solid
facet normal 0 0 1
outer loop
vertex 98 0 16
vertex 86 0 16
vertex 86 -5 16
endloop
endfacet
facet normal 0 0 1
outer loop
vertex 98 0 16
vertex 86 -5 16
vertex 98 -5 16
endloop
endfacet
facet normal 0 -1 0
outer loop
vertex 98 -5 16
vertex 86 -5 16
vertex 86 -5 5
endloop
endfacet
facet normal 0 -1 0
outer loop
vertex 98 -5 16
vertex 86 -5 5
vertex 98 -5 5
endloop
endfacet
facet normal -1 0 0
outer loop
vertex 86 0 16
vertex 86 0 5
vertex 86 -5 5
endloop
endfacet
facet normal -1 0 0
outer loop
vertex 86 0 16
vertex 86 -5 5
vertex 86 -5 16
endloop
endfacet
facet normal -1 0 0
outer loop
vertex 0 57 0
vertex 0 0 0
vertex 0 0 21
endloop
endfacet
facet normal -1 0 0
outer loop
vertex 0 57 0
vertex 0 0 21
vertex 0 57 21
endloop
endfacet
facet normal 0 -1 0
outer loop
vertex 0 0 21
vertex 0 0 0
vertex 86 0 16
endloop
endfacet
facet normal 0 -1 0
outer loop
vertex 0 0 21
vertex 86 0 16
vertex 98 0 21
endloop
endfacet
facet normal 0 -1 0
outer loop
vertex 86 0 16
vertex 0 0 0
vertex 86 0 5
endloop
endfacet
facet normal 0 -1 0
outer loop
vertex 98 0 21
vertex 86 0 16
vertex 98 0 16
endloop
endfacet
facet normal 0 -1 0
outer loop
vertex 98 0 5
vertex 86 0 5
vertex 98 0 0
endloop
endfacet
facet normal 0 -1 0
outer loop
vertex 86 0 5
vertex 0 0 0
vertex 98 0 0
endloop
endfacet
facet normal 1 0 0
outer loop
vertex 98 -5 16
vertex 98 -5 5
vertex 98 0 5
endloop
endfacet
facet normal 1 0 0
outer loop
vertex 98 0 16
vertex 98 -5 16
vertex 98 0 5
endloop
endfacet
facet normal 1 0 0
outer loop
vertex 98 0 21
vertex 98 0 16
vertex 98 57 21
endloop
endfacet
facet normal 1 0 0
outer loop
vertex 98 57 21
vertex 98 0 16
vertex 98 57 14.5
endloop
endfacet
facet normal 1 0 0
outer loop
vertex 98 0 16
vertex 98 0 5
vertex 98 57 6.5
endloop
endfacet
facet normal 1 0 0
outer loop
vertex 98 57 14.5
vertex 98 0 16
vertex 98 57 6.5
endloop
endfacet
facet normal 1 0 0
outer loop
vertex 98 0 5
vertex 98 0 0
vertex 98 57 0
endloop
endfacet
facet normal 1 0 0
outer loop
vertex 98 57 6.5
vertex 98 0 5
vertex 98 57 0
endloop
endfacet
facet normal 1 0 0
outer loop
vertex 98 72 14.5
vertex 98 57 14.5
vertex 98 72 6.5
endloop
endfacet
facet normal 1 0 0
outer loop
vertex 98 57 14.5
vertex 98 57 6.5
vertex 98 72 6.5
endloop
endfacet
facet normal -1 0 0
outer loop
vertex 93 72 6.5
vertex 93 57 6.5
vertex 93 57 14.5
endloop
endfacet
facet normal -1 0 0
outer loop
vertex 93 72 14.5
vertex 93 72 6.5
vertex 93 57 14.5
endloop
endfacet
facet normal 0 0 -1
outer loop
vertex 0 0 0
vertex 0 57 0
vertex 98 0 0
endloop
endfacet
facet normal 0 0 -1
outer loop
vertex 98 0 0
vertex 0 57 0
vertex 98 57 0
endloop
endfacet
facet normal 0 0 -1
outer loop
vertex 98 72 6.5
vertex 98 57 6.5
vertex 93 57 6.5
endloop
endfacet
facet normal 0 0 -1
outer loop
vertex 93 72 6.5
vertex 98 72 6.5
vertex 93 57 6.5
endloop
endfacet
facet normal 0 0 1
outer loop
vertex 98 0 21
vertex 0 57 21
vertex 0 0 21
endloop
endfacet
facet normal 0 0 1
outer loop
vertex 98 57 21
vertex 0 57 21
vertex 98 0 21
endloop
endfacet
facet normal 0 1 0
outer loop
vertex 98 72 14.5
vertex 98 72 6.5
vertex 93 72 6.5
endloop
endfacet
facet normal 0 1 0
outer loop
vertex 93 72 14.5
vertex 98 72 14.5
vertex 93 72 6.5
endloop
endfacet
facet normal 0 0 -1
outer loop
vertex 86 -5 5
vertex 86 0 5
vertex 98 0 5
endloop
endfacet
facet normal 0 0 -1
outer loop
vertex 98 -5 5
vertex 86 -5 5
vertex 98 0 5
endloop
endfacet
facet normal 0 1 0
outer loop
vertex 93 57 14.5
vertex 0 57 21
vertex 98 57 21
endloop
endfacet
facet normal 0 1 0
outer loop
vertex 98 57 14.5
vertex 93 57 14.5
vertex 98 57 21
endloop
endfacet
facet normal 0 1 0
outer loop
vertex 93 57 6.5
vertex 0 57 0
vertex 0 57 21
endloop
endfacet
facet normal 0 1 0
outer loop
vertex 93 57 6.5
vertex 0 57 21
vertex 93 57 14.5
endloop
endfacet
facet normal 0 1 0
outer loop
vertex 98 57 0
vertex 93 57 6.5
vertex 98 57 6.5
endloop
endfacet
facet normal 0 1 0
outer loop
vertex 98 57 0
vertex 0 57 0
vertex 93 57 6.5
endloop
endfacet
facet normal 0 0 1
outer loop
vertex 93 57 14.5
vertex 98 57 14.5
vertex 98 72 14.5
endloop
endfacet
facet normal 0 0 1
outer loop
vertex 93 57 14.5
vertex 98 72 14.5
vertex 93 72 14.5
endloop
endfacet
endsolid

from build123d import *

# Parameters (mm, degrees)
F0_W     = 98
F0_H     = 57
F1_DEPTH = 21
F2_W     = 5
F2_H     = 8
F3_DEPTH = 15
F4_W     = 12
F4_H     = 11
F5_DEPTH = 5


with BuildPart() as f1:
    # F0 (on Top) → F1 (new body)
    with BuildSketch(Plane.XY):
        with Locations((49, 28.5)):
            Rectangle(F0_W, F0_H)
    extrude(amount=F1_DEPTH)

    # F2 (on face) → F3 (join)
    with BuildSketch(Plane(origin=(0, 57, 0), x_dir=(-1, 0, 0), z_dir=(0, 1, 0))):
        with Locations((-95.5, 10.5)):
            Rectangle(F2_W, F2_H)
    extrude(amount=F3_DEPTH)

    # F4 (on face) → F5 (join)
    with BuildSketch(Plane.XZ):
        with Locations((92, 10.5)):
            Rectangle(F4_W, F4_H)
    extrude(amount=F5_DEPTH)


solid = f1.part
